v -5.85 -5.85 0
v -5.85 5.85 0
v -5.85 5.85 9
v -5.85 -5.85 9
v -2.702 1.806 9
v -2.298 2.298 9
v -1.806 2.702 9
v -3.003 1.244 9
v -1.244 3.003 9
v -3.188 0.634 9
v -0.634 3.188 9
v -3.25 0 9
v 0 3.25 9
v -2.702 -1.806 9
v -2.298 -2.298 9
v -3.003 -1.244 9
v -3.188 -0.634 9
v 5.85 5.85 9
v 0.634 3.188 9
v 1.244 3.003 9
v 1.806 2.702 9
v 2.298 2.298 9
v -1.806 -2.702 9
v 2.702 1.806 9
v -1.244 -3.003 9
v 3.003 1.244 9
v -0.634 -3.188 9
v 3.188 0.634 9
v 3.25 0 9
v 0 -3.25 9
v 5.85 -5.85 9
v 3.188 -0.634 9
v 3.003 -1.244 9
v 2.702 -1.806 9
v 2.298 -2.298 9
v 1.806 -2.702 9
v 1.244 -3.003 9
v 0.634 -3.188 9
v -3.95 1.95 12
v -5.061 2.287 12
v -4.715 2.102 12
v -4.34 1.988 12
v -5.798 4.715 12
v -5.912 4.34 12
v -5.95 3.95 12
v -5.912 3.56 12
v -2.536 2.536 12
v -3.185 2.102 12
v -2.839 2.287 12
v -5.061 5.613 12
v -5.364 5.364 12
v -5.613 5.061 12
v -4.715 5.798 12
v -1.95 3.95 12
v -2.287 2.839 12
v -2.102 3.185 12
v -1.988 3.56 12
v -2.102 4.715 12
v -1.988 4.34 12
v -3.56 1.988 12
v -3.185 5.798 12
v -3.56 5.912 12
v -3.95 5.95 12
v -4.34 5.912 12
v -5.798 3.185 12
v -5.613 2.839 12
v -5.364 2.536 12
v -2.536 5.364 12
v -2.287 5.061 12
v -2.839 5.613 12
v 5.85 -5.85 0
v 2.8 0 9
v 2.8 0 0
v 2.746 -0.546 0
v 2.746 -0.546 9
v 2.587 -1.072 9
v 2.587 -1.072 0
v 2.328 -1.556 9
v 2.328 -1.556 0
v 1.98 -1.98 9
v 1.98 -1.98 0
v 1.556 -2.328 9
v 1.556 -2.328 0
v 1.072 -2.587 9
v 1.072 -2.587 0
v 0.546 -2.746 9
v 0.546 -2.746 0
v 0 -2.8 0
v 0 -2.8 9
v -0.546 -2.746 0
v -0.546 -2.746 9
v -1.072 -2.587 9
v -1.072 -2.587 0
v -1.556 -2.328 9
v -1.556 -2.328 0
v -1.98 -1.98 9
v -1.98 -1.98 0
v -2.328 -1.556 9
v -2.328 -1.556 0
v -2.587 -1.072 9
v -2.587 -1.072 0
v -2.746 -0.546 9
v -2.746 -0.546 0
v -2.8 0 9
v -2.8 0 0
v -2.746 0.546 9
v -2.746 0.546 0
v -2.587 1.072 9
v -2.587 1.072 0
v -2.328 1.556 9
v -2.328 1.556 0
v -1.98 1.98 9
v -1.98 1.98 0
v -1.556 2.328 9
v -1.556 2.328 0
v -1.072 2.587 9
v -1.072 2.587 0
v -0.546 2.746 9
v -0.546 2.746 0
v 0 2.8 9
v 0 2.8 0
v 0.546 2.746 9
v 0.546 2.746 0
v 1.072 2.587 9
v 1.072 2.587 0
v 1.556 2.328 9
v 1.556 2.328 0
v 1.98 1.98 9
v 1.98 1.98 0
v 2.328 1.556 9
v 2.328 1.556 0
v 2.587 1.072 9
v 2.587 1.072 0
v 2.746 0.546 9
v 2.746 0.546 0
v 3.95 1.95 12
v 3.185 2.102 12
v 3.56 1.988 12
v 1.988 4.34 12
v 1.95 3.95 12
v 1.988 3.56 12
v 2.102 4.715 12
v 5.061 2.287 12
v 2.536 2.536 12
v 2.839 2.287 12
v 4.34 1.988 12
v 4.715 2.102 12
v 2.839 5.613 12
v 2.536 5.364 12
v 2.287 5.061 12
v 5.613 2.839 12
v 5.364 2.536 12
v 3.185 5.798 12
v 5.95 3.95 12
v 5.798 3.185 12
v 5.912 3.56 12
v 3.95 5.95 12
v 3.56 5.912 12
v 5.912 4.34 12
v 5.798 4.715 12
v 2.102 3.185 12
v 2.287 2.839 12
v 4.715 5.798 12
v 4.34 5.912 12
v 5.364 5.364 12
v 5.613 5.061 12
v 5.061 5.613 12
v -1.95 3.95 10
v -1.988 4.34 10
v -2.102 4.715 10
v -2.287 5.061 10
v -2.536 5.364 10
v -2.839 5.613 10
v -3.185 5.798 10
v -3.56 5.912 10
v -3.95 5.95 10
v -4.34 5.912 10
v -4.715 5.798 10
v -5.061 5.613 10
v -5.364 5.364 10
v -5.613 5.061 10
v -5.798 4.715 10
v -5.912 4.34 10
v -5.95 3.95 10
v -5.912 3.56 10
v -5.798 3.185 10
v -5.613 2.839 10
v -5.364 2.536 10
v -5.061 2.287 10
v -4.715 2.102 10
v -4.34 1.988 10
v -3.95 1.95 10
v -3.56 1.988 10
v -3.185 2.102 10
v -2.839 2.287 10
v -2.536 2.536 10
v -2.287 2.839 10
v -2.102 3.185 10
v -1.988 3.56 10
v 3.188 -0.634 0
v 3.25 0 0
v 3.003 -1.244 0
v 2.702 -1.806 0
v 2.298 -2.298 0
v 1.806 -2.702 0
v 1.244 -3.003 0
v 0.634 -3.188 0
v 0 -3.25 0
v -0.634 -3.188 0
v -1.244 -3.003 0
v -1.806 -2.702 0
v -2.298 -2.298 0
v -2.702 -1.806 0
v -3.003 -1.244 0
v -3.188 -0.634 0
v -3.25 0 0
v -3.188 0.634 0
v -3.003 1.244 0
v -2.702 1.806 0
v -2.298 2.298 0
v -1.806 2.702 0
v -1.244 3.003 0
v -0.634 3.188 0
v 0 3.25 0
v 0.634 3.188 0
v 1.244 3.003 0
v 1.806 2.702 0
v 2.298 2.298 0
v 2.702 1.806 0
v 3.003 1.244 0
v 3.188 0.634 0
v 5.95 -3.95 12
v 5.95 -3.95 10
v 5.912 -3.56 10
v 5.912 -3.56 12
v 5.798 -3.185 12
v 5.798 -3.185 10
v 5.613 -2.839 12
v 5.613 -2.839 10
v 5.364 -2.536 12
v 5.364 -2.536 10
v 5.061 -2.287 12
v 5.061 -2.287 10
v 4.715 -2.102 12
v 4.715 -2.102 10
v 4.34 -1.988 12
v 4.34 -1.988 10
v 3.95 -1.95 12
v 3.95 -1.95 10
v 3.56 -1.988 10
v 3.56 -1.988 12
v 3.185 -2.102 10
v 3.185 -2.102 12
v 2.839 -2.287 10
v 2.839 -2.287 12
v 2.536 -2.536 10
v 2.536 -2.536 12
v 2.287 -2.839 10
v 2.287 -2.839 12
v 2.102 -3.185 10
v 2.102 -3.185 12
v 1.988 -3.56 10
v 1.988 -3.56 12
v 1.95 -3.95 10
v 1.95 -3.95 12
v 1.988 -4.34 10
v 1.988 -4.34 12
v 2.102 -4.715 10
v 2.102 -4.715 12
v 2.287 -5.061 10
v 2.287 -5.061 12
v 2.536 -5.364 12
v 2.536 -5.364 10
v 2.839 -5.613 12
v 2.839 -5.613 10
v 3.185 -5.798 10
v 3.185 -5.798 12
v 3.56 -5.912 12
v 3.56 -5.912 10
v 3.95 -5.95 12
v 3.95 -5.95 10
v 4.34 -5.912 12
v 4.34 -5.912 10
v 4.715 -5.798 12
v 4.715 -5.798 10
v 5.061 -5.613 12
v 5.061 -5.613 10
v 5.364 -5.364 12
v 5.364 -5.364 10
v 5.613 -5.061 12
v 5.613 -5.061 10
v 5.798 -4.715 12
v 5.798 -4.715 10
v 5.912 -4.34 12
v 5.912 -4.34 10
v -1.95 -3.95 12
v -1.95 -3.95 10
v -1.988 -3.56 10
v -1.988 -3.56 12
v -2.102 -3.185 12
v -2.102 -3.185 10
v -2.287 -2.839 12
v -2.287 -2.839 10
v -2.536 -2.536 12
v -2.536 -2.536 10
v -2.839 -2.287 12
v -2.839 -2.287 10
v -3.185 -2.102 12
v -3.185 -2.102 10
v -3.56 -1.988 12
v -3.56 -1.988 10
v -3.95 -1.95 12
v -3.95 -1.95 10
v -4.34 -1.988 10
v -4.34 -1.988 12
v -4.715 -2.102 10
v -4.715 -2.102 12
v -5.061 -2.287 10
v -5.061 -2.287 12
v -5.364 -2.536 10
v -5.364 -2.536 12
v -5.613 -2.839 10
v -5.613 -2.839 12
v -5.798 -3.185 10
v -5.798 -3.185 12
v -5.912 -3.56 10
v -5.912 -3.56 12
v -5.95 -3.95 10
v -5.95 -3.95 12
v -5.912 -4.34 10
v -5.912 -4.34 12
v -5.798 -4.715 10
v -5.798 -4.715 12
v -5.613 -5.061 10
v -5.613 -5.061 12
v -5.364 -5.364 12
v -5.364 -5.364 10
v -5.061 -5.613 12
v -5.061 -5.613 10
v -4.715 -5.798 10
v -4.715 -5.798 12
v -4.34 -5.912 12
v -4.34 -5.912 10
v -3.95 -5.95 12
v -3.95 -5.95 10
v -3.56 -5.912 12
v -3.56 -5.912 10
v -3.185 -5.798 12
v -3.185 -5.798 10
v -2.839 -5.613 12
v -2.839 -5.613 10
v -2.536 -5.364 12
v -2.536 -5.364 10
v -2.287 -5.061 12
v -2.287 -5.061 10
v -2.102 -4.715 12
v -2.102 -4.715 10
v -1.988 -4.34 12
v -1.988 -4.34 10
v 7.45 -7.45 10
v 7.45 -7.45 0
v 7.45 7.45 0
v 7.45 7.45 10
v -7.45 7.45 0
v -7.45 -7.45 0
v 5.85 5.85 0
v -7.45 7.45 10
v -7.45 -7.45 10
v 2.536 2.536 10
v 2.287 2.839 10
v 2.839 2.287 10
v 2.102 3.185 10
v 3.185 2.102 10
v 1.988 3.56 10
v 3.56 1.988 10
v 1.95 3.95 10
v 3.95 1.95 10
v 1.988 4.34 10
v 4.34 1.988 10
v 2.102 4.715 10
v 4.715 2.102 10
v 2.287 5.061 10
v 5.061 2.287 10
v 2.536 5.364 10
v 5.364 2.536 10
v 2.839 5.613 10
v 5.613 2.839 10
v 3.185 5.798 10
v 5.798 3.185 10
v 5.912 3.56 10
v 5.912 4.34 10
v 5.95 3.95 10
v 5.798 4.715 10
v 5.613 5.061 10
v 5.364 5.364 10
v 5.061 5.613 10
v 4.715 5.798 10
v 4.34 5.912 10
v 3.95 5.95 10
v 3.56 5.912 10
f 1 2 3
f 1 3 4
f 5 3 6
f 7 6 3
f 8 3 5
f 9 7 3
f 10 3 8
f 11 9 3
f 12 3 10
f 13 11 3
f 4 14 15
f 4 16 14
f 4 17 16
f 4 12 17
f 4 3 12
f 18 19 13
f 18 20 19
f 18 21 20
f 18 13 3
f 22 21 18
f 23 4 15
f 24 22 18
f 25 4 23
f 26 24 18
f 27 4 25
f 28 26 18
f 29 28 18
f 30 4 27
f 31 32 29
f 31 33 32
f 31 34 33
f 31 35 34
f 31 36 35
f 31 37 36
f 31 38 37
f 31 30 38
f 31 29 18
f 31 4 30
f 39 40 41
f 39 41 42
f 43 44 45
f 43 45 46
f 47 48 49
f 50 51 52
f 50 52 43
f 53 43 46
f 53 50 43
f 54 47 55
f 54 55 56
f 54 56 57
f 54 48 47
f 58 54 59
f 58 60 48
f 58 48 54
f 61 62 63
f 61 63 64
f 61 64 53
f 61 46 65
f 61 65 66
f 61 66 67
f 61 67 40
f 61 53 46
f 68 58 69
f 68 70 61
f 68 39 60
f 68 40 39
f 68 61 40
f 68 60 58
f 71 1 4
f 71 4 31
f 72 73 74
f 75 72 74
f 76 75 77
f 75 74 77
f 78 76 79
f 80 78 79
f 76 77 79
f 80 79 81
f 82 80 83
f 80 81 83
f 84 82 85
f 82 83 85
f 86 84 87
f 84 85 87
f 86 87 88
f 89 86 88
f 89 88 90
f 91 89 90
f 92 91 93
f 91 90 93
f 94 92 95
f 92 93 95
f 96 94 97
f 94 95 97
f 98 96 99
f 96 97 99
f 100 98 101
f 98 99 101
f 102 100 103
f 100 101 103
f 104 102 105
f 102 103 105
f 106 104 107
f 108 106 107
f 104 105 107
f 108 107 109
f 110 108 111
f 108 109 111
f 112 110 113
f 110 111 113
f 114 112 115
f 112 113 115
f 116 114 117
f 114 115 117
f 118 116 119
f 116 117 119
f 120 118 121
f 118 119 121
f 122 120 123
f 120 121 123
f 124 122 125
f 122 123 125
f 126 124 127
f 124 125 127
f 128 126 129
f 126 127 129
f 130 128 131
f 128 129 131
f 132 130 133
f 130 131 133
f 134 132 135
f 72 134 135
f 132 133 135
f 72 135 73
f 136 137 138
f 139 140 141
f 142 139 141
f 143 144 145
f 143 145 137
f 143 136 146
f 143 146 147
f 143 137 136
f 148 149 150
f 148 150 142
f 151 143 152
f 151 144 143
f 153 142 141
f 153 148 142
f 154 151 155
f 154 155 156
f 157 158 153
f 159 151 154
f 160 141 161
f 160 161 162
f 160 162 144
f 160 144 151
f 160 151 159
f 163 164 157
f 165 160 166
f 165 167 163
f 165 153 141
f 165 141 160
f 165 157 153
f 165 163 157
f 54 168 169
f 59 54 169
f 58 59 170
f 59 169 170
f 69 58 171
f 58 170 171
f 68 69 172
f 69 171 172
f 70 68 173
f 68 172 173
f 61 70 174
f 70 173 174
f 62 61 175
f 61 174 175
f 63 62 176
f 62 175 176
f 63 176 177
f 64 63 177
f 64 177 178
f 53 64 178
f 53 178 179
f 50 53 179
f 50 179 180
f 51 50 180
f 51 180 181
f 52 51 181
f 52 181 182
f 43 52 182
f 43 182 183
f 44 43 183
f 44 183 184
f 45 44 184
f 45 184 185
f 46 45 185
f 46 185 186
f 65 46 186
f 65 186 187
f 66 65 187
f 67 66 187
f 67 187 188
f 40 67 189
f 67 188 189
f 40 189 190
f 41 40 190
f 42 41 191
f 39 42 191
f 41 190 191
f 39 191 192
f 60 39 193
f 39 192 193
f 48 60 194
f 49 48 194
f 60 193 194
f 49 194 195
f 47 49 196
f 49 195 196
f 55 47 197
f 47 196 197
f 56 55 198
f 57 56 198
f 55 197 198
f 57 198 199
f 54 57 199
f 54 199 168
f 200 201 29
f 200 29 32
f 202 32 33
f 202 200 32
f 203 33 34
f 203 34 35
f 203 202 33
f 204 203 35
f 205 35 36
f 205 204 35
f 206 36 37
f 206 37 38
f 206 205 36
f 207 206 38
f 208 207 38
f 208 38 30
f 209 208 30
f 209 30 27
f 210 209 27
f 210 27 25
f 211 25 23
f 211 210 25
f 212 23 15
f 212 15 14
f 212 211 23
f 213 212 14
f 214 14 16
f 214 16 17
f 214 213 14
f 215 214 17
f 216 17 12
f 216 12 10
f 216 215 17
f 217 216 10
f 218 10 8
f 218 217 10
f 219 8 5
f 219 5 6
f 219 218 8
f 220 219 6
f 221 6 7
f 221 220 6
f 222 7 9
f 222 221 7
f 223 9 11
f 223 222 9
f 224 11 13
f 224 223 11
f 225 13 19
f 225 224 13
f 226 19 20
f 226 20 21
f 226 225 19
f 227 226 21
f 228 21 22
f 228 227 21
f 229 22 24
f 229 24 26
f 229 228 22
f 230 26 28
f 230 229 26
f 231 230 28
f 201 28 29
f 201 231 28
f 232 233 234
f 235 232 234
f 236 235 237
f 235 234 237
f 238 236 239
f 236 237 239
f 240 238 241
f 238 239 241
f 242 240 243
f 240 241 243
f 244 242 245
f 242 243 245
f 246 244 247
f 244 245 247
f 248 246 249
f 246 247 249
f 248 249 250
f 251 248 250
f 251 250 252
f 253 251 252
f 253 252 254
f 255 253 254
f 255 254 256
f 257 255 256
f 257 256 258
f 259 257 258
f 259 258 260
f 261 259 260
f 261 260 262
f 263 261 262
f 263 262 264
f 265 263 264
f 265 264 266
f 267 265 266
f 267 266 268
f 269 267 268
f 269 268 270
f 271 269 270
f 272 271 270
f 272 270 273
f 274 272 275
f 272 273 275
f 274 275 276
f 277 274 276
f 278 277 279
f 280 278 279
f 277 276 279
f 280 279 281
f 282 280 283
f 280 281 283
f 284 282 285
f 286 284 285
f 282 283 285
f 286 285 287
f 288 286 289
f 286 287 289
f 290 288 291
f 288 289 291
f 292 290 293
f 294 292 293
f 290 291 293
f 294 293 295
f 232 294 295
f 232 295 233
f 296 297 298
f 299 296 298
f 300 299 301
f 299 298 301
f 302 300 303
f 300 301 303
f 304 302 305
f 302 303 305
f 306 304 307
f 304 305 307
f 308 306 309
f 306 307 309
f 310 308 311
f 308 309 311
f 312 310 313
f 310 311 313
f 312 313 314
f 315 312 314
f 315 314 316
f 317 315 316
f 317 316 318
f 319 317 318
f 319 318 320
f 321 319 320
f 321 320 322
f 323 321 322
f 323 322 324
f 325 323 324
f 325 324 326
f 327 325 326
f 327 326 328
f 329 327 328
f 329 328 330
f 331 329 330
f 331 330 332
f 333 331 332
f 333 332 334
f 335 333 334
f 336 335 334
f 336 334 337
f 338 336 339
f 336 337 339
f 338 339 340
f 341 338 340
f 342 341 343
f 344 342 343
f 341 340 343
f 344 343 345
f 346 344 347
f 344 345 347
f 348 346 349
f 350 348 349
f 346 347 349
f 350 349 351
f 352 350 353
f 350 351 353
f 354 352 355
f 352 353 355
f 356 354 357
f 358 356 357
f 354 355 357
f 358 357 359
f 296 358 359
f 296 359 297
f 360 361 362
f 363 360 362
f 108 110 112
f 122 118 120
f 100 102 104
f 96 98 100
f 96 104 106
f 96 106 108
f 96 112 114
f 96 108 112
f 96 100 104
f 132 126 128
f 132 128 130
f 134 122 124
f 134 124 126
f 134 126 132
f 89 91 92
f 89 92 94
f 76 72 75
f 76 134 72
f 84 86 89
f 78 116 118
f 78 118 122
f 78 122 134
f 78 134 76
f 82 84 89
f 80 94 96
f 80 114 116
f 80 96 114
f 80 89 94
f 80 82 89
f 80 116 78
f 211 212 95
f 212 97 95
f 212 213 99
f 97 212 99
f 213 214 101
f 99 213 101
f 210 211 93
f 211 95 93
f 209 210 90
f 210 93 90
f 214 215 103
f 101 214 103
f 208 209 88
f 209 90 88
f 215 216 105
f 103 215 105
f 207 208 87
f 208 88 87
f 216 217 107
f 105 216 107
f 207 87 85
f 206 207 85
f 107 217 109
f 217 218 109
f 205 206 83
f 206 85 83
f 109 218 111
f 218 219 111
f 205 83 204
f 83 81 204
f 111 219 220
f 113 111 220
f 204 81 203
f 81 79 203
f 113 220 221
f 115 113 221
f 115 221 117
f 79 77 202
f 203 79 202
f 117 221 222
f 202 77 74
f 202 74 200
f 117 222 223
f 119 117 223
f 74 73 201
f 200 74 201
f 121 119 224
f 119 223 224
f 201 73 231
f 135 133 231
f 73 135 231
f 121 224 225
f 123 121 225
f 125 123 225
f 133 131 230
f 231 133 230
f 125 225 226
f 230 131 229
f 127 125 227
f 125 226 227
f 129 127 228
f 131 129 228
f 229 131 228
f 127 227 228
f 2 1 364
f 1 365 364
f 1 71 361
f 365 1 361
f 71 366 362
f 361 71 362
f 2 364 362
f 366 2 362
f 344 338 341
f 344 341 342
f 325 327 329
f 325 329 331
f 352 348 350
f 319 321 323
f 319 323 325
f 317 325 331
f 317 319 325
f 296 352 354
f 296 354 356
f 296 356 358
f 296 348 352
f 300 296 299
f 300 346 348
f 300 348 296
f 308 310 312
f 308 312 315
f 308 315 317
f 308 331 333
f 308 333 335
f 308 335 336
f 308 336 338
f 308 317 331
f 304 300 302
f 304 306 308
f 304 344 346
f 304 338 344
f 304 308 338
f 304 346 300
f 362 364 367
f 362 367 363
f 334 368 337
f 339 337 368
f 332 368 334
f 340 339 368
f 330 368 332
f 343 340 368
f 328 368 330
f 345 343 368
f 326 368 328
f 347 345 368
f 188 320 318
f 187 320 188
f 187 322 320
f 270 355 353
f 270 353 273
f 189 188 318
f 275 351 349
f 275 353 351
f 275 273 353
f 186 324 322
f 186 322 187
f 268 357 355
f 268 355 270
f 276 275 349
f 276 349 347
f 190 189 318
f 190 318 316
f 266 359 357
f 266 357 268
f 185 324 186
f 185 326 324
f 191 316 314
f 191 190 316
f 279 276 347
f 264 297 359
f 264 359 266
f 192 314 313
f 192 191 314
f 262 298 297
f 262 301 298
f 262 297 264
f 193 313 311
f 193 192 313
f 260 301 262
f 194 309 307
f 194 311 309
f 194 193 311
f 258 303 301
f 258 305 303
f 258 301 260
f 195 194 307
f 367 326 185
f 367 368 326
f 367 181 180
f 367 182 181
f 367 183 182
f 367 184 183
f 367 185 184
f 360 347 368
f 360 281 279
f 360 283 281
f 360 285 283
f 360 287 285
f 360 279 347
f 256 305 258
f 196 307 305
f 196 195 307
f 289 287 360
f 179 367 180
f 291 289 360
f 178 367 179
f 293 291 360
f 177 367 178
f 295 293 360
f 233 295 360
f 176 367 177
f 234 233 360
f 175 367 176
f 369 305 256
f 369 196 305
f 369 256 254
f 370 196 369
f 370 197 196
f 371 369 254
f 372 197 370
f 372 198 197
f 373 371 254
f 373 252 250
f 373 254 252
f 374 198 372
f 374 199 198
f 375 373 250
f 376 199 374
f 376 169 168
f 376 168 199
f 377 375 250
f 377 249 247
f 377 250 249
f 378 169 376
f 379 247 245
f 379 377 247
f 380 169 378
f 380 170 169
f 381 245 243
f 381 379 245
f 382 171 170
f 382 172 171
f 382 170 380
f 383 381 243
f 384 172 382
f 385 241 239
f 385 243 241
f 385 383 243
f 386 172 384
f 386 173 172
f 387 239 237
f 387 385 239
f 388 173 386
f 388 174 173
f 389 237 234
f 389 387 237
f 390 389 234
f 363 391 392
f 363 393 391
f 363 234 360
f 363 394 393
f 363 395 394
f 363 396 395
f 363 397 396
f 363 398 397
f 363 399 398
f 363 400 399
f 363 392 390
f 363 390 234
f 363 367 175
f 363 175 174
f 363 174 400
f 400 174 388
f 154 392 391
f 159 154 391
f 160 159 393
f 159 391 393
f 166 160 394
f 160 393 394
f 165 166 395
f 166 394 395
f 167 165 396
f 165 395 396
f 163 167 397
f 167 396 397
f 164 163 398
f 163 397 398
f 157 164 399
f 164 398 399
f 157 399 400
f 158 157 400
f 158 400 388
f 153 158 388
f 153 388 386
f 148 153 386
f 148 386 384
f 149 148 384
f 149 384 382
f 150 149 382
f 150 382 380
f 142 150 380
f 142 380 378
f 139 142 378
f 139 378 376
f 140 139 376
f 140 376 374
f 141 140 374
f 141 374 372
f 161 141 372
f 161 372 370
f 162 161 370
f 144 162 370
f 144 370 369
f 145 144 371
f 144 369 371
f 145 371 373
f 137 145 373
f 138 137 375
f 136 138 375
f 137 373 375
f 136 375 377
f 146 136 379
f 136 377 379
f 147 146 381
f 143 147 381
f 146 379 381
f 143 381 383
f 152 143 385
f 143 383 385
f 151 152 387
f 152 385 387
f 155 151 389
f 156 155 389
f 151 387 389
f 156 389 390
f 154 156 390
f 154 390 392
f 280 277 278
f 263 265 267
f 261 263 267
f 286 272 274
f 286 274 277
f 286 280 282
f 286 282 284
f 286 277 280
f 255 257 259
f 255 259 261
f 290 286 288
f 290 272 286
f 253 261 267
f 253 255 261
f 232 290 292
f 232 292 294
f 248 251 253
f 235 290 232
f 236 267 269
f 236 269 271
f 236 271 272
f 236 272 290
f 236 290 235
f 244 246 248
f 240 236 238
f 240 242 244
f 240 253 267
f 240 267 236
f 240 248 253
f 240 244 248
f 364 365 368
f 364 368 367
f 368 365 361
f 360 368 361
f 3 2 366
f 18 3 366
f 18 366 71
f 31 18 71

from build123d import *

# Parameters (mm, degrees)
F0_W     = 14.9
F0_H     = 14.9
F0_R     = 2
F1_DEPTH = 10
F2_DEPTH = 12
F3_W     = 11.7
F3_H     = 11.7
F3_R     = 3.25
F3_R_2   = 2.8
F4_DEPTH = 9


with BuildPart() as f1:
    # F0 (on Top) → F1 (new body)
    with BuildSketch(Plane.XY):
        Rectangle(F0_W, F0_H)
        with Locations((-3.95, -3.95)):
            Circle(F0_R, mode=Mode.SUBTRACT)
        with Locations((3.95, -3.95)):
            Circle(F0_R, mode=Mode.SUBTRACT)
        with Locations((-3.95, 3.95)):
            Circle(F0_R, mode=Mode.SUBTRACT)
        with Locations((3.95, 3.95)):
            Circle(F0_R, mode=Mode.SUBTRACT)
    extrude(amount=F1_DEPTH)

    # F0 (on Top) → F2 (join)
    with BuildSketch(Plane.XY):
        with Locations((-3.95, -3.95)):
            Circle(F0_R)
        with Locations((-3.95, 3.95)):
            Circle(F0_R)
        with Locations((3.95, 3.95)):
            Circle(F0_R)
        with Locations((3.95, -3.95)):
            Circle(F0_R)
    extrude(amount=F2_DEPTH)

    # F3 (on face) → F4 (cut)
    with BuildSketch(Plane(origin=(0, 0, 0), x_dir=(1, 0, 0), z_dir=(0, 0, -1))):
        Rectangle(F3_W, F3_H)
        Circle(F3_R, mode=Mode.SUBTRACT)
        Circle(F3_R_2)
    extrude(amount=-F4_DEPTH, mode=Mode.SUBTRACT)


solid = f1.part
